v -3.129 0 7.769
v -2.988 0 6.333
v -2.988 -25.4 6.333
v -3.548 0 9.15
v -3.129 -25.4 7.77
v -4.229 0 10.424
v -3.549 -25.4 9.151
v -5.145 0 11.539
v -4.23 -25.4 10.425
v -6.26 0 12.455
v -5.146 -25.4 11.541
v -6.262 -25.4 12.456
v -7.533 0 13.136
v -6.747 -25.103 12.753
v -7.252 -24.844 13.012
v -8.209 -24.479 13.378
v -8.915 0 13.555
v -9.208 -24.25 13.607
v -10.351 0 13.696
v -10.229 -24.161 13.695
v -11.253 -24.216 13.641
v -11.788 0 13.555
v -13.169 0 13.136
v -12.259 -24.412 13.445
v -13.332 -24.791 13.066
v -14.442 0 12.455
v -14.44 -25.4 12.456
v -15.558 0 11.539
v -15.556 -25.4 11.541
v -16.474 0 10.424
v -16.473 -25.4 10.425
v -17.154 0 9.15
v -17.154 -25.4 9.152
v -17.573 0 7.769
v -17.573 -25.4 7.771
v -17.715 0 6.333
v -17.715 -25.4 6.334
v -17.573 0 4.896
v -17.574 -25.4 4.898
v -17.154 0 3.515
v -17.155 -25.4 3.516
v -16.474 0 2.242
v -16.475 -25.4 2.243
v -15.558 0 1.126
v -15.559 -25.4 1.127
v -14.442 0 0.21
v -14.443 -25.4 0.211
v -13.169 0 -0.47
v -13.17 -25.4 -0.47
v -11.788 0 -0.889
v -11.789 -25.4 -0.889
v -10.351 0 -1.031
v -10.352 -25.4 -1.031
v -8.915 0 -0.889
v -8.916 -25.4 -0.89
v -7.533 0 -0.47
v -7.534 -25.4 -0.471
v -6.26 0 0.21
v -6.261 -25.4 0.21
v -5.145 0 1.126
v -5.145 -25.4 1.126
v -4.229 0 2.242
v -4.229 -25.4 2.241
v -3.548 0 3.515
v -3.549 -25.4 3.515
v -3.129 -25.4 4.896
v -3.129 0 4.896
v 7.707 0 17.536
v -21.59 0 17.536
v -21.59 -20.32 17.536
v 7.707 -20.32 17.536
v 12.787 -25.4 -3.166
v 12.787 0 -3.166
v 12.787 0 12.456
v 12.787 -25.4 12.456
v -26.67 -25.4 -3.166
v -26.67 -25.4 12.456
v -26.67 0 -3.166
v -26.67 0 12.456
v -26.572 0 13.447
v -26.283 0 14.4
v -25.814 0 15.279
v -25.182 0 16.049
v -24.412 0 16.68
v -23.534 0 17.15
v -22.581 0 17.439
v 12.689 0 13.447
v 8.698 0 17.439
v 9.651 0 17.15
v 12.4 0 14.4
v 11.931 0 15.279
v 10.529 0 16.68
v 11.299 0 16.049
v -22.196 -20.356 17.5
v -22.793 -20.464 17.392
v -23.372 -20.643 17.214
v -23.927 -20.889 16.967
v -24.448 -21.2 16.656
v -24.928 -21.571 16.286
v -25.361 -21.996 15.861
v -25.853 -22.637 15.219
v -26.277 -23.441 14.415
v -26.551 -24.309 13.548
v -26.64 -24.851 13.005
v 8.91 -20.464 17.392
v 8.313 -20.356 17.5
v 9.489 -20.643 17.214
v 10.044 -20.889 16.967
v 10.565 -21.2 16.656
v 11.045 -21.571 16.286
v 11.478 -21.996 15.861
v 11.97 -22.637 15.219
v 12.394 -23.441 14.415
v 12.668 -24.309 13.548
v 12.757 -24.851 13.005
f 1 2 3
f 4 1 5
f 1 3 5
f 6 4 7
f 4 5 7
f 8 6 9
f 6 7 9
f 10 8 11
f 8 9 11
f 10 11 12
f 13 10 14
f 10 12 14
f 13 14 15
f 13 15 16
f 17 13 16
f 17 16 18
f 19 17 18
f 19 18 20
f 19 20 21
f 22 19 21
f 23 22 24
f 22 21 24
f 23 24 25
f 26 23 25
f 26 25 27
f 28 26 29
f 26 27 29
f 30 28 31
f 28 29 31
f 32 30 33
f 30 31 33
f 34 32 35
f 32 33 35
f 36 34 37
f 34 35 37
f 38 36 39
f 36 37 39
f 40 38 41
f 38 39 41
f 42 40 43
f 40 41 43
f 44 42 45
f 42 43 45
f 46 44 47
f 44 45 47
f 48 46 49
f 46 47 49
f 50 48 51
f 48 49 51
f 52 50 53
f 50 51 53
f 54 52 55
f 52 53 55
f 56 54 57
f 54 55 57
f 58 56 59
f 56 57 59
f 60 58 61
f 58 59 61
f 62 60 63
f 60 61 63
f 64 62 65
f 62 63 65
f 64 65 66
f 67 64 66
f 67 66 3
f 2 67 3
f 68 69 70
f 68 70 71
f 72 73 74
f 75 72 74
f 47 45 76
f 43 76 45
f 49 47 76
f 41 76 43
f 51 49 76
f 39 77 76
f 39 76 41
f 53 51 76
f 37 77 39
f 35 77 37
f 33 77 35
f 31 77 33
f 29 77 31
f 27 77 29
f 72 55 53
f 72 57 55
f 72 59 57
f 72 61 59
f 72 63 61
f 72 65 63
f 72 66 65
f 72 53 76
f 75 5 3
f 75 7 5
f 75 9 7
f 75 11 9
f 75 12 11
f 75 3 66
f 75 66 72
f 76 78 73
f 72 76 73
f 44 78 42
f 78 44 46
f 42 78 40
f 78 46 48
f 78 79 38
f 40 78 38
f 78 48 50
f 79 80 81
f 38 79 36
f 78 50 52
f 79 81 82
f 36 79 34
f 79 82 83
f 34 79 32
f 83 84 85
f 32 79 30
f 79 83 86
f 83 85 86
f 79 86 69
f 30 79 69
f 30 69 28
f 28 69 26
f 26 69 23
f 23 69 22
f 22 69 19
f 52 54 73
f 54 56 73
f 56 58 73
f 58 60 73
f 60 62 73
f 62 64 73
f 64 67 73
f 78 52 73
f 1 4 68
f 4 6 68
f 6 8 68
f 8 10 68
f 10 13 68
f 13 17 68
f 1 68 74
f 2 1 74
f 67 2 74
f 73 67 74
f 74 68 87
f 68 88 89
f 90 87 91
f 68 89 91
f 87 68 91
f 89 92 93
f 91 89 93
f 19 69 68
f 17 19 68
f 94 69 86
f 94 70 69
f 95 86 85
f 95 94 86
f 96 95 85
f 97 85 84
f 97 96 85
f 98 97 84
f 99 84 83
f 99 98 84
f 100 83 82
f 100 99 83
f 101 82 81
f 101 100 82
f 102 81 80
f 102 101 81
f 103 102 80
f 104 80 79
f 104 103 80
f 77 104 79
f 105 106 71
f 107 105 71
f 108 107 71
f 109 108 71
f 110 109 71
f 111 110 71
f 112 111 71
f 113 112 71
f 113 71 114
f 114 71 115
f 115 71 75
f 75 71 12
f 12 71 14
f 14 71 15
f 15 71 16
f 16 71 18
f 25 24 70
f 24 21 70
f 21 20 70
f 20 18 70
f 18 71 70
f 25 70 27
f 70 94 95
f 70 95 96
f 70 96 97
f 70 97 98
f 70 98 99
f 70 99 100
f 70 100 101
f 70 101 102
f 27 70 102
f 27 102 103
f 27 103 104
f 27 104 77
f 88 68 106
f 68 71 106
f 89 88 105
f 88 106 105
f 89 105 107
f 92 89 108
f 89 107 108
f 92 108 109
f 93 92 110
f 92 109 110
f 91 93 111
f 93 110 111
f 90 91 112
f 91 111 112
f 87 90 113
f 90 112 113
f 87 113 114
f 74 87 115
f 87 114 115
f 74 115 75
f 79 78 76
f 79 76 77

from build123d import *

# Parameters (mm, degrees)
F0_W        = 39.4569858909
F0_H        = 20.7027406432
F1_DEPTH    = 25.4
F2_R        = 7.3634612469
F3_DEPTH    = 25.4
F4_T1_DEPTH = 65.5852850486
F5_R        = 5.08
F6_R        = 5.08


# Not quite as in the source:
# - a fillet or chamfer that OpenCascade refuses, or shapes differently, is made with other operations: its cross-section is extruded or revolved along the edge and cut away or added


with BuildPart() as f1:
    # F0 (on Front) → F1 (new body)
    with BuildSketch(Plane.XZ):
        with Locations((-6.9415066391, 7.18506868)):
            Rectangle(F0_W, F0_H)
    extrude(amount=F1_DEPTH)

    # F2 (on face) → F3 (cut)
    with BuildSketch(Plane.XZ.offset(25.4)):
        with Locations((-10.3513691574, 6.3326032832)):
            Circle(F2_R)
    extrude(amount=-F3_DEPTH, mode=Mode.SUBTRACT)

    # F4: chamfer of 5.08 on 1 edges, made by hand

    # F4_s2 → F4_t1 (cut)
    with BuildSketch(Plane.YZ.offset(-39.7341491634)):
        Polygon((-20.32, 17.5364390016), (-25.4, 12.4564390016), (-25.4, 17.5364390016), align=None)
    extrude(amount=F4_T1_DEPTH, mode=Mode.SUBTRACT)

    # F5
    f5_edges = [f1.edges().sort_by_distance(p)[0] for p in [
        (12.786986, -10.16, 17.536439),
    ]]
    fillet(f5_edges, radius=F5_R)

    # F6
    f6_edges = [f1.edges().sort_by_distance(p)[0] for p in [
        (-26.67, -10.16, 17.536439),
    ]]
    fillet(f6_edges, radius=F6_R)


solid = f1.part
